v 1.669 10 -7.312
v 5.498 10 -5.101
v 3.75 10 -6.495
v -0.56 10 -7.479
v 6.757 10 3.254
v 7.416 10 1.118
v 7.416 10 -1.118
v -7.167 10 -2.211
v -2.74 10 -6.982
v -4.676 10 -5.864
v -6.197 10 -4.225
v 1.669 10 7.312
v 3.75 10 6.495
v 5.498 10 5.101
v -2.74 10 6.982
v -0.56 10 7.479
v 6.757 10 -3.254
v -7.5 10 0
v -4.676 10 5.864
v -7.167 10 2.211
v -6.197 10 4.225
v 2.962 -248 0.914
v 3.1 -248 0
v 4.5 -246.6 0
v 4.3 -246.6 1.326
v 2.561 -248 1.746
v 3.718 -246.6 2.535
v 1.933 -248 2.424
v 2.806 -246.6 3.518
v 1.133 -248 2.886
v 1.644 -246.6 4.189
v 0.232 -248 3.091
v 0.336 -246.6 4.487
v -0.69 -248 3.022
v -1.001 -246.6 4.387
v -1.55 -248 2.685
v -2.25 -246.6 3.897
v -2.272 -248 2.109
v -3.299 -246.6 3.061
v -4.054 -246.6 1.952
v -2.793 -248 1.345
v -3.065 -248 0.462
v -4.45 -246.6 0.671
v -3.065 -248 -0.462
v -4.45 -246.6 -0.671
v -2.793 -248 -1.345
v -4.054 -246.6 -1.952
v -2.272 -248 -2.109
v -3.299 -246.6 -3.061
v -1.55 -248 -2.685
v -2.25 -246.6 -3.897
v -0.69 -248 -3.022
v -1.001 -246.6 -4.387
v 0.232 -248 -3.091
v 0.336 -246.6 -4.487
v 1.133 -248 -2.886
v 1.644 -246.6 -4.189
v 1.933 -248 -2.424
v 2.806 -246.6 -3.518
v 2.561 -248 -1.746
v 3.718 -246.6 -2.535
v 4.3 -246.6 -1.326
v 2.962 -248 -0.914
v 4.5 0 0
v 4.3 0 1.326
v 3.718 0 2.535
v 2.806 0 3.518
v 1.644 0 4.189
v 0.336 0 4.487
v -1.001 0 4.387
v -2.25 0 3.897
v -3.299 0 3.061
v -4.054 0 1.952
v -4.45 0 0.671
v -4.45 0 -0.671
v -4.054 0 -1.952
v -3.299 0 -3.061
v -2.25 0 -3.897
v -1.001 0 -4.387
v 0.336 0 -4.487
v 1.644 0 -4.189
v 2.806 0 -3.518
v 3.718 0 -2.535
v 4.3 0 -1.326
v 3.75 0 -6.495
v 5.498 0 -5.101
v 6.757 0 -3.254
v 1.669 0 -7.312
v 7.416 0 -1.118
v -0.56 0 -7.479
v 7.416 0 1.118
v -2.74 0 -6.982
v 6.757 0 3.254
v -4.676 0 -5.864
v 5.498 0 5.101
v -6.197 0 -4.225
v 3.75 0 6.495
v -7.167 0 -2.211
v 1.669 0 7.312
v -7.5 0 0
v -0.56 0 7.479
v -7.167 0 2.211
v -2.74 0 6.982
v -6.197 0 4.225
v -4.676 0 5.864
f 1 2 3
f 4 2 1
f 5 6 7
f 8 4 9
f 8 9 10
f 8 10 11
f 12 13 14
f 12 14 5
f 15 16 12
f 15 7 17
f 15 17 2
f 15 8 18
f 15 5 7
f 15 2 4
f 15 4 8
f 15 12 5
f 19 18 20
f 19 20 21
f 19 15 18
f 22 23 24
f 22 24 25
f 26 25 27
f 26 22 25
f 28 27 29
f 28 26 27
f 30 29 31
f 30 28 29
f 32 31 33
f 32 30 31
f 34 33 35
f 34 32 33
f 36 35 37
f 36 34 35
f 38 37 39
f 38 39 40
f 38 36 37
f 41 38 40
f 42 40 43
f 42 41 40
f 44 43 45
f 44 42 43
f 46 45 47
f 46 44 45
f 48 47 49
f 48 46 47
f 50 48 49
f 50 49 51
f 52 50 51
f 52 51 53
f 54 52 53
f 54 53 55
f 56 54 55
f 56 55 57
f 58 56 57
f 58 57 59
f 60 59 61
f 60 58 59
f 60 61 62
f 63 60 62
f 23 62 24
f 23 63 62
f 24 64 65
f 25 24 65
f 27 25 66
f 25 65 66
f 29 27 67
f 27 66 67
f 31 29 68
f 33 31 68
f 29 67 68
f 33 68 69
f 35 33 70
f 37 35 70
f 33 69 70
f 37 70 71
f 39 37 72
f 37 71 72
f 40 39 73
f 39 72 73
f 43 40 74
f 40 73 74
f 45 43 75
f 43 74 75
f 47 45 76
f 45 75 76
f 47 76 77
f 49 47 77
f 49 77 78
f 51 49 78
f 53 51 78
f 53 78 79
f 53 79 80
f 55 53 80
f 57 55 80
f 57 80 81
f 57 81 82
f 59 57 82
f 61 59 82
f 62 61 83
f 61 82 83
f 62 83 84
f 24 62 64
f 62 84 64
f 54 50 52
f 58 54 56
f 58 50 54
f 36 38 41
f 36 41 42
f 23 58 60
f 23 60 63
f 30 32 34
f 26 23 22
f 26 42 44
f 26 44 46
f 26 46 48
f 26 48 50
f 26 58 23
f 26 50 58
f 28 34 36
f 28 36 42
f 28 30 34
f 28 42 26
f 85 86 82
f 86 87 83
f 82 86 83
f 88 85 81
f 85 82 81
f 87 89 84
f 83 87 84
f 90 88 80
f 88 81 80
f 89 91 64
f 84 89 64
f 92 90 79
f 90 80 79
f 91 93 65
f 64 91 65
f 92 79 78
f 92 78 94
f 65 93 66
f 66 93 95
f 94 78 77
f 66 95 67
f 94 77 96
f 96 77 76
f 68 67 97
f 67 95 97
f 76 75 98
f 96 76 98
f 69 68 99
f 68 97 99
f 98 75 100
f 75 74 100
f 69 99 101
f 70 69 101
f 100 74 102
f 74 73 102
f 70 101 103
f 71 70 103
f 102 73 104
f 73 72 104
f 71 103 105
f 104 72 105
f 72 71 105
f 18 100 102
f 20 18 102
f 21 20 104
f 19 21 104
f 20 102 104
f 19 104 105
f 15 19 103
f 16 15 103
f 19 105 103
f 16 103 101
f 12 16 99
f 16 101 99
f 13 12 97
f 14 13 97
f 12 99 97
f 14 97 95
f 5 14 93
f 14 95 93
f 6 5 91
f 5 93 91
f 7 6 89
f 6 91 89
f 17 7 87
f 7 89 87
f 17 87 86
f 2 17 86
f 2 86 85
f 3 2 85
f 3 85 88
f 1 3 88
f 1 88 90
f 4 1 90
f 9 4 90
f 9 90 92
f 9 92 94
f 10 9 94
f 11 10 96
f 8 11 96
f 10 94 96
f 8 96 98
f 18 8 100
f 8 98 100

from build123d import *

# Parameters (mm, degrees)
F0_R     = 4.5
F1_DEPTH = 248
F2_R     = 7.5
F3_DEPTH = 10
F4_SIZE  = 1.4


with BuildPart() as f1:
    # F0 (on Front) → F1 (new body)
    with BuildSketch(Plane.XZ):
        Circle(F0_R)
    extrude(amount=F1_DEPTH)

    # F2 (on face) → F3 (join)
    with BuildSketch(Plane(origin=(0, 0, 0), x_dir=(-1, 0, 0), z_dir=(0, 1, 0))):
        Circle(F2_R)
    extrude(amount=F3_DEPTH)

    # F4
    f4_edges = [f1.edges().sort_by_distance(p)[0] for p in [
        (-4.5, -248, 0),
    ]]
    chamfer(f4_edges, length=F4_SIZE)


solid = f1.part
